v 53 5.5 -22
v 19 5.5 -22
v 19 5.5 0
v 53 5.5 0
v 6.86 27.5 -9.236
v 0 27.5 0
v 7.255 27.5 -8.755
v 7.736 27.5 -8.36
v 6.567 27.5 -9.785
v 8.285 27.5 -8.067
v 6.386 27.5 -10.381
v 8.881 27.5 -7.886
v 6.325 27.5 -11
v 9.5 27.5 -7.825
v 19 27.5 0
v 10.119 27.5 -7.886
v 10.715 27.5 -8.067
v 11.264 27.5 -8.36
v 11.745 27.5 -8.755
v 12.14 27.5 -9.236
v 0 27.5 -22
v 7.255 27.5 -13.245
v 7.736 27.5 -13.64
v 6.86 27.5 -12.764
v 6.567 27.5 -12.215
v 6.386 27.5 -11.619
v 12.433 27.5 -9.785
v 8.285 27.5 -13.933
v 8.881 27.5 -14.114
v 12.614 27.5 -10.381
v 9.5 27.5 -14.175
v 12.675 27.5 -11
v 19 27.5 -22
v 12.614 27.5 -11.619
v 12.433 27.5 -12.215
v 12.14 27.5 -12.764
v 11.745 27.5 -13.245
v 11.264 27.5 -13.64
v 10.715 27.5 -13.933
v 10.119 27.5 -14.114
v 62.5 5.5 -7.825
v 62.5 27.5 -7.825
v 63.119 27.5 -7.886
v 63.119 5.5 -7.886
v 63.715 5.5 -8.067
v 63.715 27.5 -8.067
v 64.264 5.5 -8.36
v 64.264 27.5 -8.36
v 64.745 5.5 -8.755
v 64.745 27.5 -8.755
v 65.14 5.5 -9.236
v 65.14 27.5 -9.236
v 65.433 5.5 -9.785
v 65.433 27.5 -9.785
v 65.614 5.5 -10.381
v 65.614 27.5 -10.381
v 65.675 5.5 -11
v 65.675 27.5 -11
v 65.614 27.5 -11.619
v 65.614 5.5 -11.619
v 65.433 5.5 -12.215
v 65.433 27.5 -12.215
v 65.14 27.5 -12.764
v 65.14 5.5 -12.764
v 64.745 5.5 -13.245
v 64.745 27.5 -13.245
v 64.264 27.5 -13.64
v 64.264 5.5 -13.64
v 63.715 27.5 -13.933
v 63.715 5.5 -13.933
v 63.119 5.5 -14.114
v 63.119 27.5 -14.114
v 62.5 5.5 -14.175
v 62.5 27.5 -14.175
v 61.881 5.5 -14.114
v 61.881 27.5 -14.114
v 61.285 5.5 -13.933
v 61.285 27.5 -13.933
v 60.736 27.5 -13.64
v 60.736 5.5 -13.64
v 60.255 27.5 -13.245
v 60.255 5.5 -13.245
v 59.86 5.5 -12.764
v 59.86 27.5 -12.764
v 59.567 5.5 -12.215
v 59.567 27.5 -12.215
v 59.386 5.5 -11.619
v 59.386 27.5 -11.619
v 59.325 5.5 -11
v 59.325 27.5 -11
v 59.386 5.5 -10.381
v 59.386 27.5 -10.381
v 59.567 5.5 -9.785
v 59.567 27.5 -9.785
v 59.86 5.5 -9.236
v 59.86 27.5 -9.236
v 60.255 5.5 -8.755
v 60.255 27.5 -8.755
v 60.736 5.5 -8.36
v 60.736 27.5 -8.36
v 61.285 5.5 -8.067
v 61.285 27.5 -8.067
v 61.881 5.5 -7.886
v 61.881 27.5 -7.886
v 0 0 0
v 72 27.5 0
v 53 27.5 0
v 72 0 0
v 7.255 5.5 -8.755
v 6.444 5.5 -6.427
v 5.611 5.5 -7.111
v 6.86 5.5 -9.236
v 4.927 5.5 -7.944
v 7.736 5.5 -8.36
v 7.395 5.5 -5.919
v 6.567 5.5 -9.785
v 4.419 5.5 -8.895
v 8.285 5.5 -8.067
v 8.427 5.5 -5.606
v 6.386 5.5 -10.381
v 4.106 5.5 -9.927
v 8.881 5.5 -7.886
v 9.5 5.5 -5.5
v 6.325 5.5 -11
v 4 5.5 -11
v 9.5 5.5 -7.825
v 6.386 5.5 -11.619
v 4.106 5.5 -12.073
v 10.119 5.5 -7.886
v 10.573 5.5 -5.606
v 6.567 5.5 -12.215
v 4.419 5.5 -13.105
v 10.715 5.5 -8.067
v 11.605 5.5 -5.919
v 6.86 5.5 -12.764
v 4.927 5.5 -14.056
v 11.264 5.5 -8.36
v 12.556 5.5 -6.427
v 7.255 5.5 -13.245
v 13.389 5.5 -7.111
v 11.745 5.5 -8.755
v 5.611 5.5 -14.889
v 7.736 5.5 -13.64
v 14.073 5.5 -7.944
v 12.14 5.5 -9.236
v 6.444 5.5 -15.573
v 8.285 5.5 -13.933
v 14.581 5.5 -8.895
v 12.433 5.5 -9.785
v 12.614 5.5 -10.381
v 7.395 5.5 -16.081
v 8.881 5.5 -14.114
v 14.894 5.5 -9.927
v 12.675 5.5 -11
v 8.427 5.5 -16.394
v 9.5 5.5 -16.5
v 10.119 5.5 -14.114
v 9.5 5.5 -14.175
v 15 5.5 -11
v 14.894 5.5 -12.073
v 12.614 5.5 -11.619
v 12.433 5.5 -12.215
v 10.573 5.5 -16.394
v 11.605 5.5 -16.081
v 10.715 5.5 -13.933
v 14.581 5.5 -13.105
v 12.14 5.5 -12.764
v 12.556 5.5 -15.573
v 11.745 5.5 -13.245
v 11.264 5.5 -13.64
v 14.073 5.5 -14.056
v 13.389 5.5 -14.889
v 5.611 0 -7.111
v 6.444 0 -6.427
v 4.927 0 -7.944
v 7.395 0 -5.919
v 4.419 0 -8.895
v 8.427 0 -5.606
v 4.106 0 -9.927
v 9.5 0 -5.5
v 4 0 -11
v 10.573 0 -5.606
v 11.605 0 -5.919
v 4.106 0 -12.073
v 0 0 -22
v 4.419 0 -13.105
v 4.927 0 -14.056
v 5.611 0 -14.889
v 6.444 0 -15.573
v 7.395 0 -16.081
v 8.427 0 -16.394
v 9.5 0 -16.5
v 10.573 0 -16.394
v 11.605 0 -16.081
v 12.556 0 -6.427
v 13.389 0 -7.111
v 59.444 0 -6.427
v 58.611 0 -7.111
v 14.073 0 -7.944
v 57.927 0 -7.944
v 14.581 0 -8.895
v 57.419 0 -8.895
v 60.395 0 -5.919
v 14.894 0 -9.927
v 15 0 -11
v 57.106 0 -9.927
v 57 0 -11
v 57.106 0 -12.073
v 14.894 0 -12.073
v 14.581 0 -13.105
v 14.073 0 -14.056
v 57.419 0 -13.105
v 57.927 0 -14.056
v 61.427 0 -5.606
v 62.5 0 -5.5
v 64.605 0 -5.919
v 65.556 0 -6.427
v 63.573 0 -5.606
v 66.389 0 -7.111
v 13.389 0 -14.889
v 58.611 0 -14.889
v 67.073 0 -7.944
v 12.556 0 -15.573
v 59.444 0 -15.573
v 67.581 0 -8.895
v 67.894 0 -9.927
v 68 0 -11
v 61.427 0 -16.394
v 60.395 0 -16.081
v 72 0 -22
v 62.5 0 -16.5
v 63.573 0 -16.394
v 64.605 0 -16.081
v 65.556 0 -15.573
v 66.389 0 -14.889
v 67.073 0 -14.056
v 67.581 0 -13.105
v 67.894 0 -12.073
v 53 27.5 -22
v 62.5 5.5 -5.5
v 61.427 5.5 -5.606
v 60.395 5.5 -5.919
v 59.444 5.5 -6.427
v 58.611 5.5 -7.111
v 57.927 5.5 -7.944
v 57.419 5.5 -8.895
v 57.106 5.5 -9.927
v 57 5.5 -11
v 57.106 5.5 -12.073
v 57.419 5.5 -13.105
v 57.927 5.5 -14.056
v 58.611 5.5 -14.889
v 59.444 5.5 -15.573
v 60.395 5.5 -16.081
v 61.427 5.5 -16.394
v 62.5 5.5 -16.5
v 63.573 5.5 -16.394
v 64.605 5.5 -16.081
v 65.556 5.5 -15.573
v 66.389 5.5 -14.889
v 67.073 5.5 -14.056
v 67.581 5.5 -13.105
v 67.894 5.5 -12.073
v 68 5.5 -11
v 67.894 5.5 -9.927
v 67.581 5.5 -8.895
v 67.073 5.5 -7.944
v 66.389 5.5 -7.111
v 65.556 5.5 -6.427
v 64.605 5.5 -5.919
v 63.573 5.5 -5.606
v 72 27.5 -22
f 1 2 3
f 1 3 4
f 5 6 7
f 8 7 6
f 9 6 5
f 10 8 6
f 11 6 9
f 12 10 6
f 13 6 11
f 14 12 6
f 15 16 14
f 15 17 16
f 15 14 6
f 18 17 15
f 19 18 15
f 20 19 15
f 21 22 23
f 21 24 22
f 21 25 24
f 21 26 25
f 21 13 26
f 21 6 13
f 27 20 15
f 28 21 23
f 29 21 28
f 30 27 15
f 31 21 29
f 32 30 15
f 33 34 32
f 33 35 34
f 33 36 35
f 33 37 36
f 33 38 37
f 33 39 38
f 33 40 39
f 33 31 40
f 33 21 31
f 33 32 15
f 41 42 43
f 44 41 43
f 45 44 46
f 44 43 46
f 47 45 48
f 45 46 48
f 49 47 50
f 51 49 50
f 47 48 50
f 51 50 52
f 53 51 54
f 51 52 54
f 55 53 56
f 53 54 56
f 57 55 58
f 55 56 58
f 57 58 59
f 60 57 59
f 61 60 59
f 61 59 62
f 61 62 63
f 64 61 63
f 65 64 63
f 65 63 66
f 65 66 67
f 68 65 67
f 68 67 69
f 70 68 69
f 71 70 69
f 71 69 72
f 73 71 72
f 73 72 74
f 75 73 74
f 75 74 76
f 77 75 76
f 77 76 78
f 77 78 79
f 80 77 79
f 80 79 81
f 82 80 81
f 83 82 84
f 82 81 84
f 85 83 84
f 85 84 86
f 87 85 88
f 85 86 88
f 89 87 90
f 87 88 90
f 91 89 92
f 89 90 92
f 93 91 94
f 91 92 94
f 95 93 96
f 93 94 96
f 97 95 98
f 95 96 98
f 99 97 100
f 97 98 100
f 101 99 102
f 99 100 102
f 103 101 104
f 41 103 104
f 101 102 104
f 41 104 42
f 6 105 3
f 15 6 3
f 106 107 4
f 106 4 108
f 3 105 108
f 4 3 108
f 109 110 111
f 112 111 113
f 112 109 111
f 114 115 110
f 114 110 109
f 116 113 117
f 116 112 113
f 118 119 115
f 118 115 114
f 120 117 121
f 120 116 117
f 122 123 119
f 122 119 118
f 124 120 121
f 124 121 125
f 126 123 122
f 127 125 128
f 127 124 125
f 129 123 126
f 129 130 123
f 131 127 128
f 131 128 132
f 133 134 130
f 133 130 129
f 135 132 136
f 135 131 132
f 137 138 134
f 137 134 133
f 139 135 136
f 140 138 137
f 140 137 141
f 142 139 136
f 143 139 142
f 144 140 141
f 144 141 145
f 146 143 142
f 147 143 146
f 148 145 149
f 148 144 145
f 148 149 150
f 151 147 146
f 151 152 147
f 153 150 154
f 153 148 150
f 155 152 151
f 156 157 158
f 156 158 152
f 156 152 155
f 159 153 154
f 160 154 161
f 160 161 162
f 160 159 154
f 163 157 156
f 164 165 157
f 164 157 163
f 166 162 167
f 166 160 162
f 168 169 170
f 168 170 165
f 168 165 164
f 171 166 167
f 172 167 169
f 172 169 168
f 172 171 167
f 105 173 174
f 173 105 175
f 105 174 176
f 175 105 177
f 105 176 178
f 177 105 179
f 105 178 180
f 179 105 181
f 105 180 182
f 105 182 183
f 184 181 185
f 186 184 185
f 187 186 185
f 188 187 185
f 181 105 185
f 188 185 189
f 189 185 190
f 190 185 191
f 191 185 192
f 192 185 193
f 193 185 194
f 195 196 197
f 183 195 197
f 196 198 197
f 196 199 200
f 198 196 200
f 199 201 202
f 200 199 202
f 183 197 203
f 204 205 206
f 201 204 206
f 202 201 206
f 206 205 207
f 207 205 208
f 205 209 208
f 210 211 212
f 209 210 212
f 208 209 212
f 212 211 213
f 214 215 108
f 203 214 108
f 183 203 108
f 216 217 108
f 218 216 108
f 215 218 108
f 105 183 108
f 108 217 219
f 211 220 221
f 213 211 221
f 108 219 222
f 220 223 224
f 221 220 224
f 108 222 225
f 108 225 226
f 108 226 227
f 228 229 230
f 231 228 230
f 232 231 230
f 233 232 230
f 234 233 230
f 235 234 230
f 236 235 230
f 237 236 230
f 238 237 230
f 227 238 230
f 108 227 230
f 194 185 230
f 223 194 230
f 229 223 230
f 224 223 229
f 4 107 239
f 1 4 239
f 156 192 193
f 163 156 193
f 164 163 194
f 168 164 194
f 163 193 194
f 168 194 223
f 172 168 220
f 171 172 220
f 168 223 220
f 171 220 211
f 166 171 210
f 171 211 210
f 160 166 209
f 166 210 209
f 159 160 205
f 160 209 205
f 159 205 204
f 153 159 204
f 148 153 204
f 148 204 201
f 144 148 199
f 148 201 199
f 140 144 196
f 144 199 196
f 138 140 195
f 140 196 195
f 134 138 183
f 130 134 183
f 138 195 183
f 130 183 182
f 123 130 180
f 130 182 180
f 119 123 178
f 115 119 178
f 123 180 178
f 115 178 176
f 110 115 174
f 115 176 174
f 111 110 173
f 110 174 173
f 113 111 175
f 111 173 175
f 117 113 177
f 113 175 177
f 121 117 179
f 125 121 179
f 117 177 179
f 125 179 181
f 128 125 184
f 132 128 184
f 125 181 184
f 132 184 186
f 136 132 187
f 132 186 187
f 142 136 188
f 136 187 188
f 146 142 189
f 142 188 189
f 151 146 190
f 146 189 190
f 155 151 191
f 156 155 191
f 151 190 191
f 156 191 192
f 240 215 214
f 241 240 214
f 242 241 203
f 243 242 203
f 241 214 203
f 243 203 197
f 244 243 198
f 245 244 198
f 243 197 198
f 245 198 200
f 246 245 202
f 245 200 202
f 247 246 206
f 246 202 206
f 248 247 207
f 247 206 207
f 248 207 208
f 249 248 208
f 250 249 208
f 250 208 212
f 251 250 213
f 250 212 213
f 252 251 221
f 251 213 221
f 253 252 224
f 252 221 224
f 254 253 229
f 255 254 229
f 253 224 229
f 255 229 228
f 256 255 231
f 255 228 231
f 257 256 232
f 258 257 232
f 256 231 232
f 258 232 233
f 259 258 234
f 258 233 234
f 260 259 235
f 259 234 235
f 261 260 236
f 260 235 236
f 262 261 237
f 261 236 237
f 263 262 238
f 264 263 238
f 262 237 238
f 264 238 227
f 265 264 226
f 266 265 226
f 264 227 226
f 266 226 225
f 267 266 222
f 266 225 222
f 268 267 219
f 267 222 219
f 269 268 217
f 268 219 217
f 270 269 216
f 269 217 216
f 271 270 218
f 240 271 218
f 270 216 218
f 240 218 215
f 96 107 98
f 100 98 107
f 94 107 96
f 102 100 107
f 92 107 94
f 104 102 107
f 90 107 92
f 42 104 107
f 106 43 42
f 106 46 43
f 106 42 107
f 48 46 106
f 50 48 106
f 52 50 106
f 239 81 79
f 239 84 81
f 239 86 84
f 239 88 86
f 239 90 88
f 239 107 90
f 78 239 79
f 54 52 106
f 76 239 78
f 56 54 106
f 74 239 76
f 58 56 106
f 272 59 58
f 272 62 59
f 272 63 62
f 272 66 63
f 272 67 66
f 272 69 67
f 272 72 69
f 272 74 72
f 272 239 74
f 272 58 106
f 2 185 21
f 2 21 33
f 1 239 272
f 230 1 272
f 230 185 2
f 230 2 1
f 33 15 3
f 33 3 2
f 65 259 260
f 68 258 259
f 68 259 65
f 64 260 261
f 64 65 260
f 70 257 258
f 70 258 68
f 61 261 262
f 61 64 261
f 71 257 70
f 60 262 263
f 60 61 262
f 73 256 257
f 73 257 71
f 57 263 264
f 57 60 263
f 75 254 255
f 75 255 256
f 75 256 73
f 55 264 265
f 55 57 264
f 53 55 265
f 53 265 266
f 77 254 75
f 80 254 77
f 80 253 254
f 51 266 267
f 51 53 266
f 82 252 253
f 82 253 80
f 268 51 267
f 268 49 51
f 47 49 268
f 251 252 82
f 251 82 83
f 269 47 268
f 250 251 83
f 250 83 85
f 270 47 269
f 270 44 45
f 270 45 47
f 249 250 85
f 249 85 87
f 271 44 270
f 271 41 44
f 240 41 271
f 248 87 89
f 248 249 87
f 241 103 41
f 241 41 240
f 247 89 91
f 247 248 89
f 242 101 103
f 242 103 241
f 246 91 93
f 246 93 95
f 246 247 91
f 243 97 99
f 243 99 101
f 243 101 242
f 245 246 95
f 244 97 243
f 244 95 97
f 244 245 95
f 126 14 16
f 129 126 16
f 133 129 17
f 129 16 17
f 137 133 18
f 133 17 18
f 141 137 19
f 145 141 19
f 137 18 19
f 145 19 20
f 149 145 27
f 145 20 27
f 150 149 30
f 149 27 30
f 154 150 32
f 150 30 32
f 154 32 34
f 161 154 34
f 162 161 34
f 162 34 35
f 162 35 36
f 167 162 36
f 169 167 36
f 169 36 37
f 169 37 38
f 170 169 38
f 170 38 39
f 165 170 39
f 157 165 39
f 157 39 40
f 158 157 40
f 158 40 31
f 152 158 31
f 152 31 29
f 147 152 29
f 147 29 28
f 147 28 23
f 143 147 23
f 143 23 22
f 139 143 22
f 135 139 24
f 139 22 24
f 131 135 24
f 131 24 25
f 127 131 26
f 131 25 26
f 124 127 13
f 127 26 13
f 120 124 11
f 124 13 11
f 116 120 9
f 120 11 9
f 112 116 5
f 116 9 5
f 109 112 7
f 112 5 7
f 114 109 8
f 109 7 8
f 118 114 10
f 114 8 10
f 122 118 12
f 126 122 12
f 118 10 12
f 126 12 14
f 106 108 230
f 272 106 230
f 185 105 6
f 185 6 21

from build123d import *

# Parameters (mm, degrees)
SKETCH1_W           = 72
SKETCH1_H           = 22
BOSS_EXTRUDE1_DEPTH = 27.5
SKETCH2_W           = 34
SKETCH2_H           = 22
CUT_EXTRUDE1_DEPTH  = 22
SKETCH3_R           = 3.175
CUT_EXTRUDE2_DEPTH  = 69
SKETCH5_R           = 5.5
CUT_EXTRUDE3_DEPTH  = 5.5


with BuildPart() as part:
    # Sketch1 → Boss-Extrude1 (new body)
    with BuildSketch(Plane(origin=(0, 0, 0), x_dir=(1, 0, 0), z_dir=(0, 1, 0))):
        with Locations((36, 11)):
            Rectangle(SKETCH1_W, SKETCH1_H)
    extrude(amount=BOSS_EXTRUDE1_DEPTH)

    # Sketch2 → Cut-Extrude1 (cut)
    with BuildSketch(Plane(origin=(0, 27.5, 0), x_dir=(1, 0, 0), z_dir=(0, 1, 0))):
        with Locations((36, 11)):
            Rectangle(SKETCH2_W, SKETCH2_H)
    extrude(amount=-CUT_EXTRUDE1_DEPTH, mode=Mode.SUBTRACT)

    # Sketch3 → Cut-Extrude2 (cut)
    with BuildSketch(Plane(origin=(0, 27.5, 0), x_dir=(1, 0, 0), z_dir=(0, 1, 0))):
        with Locations(Location((9.5, 11, 0), (0, 0, 270))):
            Circle(SKETCH3_R)
        with Locations(Location((62.5, 11, 0), (0, 0, 270))):
            Circle(SKETCH3_R)
    extrude(amount=-CUT_EXTRUDE2_DEPTH, mode=Mode.SUBTRACT)

    # Sketch5 → Cut-Extrude3 (cut)
    with BuildSketch(Plane.XZ):
        with Locations(Location((9.5, -11, 0), (0, 0, 270))):
            Circle(SKETCH5_R)
        with Locations(Location((62.5, -11, 0), (0, 0, 90))):
            Circle(SKETCH5_R)
    extrude(amount=-CUT_EXTRUDE3_DEPTH, mode=Mode.SUBTRACT)


solid = part.part
